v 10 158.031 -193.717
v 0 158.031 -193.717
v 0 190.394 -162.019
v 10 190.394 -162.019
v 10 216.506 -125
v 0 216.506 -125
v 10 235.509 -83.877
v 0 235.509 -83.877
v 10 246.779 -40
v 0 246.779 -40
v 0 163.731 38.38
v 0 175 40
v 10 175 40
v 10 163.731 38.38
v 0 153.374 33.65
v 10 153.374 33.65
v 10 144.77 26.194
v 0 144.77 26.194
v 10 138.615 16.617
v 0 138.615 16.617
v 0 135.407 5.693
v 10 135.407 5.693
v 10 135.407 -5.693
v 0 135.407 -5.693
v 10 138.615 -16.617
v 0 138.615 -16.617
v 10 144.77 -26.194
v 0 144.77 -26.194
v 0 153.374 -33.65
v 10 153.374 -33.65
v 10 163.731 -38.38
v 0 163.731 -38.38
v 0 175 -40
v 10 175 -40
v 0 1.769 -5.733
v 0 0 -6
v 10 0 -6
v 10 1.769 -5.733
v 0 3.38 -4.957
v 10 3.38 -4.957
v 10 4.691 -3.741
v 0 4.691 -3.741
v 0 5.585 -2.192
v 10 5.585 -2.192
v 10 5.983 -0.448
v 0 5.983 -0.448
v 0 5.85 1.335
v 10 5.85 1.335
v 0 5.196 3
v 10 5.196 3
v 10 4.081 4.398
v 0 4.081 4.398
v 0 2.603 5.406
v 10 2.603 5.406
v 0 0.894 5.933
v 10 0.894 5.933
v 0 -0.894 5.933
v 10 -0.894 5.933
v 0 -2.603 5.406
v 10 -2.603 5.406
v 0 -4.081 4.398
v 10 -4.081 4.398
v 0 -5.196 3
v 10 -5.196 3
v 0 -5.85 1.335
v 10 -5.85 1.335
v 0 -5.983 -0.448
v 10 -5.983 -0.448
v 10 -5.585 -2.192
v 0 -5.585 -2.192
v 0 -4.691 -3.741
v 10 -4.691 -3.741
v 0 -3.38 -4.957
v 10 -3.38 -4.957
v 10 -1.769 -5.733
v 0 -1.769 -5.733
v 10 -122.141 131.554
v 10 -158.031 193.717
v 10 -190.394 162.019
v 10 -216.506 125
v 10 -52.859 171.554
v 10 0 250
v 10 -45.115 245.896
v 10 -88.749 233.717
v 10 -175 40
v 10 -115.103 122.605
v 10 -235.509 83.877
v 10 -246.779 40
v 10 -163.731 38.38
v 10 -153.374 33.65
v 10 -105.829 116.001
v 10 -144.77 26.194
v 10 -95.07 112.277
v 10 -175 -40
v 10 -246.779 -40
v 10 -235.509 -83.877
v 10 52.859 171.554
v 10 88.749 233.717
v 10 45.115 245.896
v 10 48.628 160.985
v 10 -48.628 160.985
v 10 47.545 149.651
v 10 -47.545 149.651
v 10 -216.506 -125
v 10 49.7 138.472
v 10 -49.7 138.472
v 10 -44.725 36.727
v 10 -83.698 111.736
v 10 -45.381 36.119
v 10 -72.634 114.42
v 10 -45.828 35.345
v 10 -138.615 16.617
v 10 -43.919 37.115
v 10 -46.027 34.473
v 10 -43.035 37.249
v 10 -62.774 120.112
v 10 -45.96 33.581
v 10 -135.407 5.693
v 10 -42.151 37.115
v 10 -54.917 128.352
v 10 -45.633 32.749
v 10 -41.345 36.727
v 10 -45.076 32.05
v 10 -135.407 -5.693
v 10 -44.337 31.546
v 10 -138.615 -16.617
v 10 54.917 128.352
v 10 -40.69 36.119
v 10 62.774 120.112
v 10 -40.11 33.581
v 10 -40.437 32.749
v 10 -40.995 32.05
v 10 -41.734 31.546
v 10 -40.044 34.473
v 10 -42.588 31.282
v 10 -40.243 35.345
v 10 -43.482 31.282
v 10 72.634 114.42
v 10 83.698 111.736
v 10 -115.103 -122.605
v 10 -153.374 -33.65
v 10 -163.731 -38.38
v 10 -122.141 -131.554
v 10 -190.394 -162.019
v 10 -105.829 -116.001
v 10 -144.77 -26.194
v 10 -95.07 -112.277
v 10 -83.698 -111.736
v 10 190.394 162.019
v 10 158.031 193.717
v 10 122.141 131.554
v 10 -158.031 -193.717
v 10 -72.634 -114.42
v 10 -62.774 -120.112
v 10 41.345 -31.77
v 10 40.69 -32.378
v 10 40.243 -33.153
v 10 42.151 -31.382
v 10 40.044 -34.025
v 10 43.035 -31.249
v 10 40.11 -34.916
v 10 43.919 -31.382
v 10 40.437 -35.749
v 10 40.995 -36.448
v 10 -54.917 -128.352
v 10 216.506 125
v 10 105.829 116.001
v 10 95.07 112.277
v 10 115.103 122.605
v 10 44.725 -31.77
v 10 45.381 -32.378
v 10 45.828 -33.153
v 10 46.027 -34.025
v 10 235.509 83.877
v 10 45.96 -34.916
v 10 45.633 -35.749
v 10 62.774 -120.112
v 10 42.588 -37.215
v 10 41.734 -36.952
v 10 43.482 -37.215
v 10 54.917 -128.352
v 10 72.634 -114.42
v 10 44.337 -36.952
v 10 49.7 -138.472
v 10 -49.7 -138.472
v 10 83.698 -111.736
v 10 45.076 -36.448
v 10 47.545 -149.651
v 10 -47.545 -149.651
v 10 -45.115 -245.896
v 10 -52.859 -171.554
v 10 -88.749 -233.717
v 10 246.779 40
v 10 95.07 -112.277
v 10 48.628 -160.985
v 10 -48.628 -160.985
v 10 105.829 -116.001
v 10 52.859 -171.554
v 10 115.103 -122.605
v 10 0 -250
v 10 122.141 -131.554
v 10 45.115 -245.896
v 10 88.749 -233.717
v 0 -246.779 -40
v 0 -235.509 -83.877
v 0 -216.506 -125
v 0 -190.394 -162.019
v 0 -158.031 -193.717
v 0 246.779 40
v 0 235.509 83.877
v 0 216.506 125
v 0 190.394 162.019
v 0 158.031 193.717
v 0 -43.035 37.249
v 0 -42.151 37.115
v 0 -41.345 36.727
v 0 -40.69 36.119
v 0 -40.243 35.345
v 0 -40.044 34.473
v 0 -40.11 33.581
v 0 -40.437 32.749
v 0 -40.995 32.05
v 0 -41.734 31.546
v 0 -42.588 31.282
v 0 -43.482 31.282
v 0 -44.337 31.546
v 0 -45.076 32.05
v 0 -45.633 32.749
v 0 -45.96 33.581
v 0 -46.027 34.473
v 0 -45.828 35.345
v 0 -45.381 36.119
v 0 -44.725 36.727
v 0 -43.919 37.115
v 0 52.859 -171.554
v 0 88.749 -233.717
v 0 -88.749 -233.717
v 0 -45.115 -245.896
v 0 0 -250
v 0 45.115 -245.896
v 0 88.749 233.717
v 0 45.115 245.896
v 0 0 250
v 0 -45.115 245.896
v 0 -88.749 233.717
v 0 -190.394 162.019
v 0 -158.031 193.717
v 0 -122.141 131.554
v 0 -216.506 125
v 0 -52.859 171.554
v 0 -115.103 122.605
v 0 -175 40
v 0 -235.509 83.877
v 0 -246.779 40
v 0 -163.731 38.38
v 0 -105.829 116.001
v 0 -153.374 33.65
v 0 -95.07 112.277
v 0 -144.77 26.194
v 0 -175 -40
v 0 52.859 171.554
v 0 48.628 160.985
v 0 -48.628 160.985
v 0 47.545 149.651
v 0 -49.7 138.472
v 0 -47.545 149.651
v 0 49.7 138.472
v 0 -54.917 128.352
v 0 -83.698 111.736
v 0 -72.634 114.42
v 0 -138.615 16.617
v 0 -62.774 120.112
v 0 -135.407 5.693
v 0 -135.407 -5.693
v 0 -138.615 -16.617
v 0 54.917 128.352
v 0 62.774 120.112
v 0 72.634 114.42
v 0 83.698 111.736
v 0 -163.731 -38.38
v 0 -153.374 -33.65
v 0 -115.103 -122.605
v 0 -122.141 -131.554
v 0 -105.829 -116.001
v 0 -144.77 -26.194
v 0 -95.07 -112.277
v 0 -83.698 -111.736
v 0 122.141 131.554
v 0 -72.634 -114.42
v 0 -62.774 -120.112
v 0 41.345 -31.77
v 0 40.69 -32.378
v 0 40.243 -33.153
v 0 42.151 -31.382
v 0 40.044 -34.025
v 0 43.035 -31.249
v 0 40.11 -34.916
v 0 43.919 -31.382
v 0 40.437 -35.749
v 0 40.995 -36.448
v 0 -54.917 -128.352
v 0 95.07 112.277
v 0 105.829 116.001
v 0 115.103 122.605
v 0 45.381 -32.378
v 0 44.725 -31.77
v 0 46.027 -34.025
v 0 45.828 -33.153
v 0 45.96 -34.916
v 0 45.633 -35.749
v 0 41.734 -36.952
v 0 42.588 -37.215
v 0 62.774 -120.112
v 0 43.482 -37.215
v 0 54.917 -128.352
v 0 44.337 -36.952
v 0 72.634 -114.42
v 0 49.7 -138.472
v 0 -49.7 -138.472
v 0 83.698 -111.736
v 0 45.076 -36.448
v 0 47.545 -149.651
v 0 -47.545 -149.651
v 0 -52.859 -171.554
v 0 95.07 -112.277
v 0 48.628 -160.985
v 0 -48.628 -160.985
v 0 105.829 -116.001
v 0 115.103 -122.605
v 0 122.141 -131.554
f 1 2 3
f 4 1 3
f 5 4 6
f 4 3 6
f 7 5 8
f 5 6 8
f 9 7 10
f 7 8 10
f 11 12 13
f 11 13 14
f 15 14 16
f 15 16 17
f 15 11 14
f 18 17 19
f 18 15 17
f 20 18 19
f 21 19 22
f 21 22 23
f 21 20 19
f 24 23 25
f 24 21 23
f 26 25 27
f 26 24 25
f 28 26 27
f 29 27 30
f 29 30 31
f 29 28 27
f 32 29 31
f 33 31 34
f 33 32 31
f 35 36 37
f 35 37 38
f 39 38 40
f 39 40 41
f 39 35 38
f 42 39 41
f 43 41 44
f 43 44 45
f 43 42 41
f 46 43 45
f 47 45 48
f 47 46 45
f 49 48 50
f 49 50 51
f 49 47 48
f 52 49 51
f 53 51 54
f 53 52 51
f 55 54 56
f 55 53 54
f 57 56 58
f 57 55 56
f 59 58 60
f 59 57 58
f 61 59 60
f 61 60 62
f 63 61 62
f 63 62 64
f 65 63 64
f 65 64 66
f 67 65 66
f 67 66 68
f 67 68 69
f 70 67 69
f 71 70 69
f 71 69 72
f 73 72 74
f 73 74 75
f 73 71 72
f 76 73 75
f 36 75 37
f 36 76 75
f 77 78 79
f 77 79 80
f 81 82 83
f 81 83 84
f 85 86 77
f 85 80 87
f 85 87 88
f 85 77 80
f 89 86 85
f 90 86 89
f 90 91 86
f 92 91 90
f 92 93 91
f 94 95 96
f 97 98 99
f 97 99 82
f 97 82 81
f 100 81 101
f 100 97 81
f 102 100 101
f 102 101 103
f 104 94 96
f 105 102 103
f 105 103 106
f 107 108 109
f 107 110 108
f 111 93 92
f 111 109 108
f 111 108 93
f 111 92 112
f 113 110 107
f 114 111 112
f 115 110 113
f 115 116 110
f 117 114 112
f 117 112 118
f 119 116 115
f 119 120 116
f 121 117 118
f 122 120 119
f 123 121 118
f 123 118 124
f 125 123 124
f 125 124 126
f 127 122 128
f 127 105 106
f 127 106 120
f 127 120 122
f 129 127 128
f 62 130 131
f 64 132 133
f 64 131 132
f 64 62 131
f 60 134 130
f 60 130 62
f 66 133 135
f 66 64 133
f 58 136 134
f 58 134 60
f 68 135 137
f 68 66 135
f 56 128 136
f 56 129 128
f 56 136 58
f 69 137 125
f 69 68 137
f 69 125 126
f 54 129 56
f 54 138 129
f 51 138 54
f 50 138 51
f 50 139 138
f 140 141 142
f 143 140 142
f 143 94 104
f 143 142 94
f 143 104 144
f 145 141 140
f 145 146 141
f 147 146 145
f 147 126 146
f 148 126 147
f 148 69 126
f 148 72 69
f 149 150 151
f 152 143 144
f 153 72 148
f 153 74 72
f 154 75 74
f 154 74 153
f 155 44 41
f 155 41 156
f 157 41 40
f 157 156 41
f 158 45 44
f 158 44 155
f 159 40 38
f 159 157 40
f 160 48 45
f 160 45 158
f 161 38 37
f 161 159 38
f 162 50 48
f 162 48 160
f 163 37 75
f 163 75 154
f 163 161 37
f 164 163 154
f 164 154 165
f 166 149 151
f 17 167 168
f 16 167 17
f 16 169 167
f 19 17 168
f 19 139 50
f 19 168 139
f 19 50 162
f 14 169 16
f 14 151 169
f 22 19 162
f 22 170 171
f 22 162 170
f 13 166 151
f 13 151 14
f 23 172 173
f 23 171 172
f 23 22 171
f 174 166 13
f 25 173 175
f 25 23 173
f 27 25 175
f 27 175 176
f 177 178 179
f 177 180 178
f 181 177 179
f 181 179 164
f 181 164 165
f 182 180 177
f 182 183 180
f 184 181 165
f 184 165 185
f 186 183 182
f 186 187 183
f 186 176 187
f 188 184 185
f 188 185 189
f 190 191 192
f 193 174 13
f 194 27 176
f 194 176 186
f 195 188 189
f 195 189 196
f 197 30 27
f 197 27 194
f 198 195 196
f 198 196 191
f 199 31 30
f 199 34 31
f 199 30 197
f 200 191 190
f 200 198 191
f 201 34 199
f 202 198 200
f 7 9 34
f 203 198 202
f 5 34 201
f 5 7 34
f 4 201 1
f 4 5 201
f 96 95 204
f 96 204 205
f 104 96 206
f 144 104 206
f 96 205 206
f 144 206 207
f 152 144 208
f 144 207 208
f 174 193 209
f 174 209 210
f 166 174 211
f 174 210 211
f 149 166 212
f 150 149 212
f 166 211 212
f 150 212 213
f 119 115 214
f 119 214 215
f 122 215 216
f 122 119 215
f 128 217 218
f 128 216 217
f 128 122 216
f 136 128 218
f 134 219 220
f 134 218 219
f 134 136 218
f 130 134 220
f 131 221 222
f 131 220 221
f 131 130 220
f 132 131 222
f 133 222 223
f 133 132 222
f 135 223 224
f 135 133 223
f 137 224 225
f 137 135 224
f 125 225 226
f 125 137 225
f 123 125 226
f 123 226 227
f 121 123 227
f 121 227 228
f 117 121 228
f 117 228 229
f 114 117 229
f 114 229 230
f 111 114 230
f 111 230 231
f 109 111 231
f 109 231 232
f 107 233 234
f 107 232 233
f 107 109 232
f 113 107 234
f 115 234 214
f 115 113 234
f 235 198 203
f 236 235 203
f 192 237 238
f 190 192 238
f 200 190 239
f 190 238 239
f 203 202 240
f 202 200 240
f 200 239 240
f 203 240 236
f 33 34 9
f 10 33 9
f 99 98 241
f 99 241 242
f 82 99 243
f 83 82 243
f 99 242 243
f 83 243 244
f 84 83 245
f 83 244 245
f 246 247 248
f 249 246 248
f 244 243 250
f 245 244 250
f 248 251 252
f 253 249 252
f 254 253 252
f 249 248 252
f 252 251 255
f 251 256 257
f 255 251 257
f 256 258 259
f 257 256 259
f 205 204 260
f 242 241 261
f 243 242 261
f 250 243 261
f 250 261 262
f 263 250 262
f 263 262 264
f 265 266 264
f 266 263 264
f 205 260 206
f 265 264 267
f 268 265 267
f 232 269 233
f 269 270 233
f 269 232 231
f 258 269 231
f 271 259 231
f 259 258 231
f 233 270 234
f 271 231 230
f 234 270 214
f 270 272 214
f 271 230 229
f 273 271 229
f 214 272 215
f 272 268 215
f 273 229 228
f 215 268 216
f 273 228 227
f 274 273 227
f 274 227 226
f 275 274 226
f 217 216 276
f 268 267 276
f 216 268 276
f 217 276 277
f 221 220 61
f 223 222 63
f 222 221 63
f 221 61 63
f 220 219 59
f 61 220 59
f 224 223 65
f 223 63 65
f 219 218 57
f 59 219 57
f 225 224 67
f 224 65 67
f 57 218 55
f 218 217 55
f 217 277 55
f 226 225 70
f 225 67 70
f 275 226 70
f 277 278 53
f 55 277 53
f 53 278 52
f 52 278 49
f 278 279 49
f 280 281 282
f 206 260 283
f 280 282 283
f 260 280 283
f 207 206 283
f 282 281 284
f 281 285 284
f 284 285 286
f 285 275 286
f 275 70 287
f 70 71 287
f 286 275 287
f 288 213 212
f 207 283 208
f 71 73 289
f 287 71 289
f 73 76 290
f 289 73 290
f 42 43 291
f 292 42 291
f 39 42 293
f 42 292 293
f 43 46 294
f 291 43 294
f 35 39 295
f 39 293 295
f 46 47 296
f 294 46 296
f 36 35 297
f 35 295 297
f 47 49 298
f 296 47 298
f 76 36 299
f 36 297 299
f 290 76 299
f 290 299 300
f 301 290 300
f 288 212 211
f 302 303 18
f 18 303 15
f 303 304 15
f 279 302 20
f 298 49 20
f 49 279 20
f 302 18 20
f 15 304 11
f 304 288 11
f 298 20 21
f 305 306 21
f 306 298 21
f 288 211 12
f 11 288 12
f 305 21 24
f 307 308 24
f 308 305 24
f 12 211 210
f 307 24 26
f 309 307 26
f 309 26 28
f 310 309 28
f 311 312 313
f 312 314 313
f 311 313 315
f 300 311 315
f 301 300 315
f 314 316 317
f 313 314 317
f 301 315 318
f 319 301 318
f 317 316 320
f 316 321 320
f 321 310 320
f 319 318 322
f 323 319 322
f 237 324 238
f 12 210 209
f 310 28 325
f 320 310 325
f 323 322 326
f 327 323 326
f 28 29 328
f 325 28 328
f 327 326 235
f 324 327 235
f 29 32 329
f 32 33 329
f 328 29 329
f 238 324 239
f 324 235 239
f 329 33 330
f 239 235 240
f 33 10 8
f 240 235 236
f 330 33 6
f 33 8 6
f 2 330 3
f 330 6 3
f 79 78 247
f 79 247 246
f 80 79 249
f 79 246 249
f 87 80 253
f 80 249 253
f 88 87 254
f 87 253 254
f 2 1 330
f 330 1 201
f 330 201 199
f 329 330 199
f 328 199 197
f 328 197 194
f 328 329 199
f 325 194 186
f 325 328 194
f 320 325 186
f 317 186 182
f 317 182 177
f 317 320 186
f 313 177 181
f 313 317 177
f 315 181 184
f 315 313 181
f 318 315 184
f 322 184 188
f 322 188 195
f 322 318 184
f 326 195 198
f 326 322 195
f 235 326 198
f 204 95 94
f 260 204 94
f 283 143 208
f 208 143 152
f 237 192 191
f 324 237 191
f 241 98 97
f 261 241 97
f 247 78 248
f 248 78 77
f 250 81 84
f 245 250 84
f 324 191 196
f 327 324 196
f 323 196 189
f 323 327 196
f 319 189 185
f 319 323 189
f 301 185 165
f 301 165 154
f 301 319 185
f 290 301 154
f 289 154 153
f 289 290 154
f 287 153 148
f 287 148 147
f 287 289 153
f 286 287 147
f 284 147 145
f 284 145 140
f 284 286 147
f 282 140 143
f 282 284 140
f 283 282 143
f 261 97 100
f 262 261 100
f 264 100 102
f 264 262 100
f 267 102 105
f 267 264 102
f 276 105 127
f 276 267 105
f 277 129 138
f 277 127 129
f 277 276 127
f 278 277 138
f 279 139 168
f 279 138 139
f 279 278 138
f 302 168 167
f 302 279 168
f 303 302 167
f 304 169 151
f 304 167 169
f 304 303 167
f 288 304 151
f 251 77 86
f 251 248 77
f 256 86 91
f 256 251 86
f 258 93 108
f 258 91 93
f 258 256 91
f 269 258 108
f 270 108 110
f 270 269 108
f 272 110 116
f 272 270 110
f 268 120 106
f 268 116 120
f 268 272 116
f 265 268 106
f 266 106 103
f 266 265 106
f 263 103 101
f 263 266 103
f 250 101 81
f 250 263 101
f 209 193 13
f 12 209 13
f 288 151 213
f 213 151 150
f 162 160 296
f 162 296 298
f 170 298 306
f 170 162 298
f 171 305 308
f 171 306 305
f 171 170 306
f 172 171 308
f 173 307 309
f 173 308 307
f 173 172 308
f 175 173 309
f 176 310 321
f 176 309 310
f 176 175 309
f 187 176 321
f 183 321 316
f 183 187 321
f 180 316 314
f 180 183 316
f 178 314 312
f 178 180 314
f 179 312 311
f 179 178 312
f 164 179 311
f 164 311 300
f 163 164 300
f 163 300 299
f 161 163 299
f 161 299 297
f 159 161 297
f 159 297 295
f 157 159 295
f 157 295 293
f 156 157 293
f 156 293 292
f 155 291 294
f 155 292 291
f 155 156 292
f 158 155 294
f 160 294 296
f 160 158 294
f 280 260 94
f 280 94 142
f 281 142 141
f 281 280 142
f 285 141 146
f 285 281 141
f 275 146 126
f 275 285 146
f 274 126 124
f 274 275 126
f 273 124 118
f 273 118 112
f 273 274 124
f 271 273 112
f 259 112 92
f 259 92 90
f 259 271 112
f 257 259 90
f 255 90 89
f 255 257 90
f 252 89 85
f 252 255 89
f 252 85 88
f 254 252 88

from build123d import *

# Parameters (mm, degrees)
SKETCH1_R               = 250
SKETCH1_R_2             = 6
SKETCH1_R_3             = 40
BOSS_EXTRUDE1_DEPTH     = 10
CUT_EXTRUDE1_DEPTH      = 354.694783677
CUT_EXTRUDE1_DEPTH_BACK = 354.694783677
SKETCH2_R               = 3


with BuildPart() as part:
    # Sketch1 → Boss-Extrude1 (new body)
    with BuildSketch(Plane(origin=(0, 0, 0), x_dir=(0, 0, -1), z_dir=(1, 0, 0))):
        Circle(SKETCH1_R)
        Circle(SKETCH1_R_2, mode=Mode.SUBTRACT)
        with Locations((0, 175)):
            Circle(SKETCH1_R_3, mode=Mode.SUBTRACT)
        with Locations((151.554445662, 87.5)):
            Circle(SKETCH1_R_3, mode=Mode.SUBTRACT)
        with Locations((151.554445662, -87.5)):
            Circle(SKETCH1_R_3, mode=Mode.SUBTRACT)
        with Locations((0, -175)):
            Circle(SKETCH1_R_3, mode=Mode.SUBTRACT)
        with Locations((-151.554445662, -87.5)):
            Circle(SKETCH1_R_3, mode=Mode.SUBTRACT)
        with Locations((-151.554445662, 87.5)):
            Circle(SKETCH1_R_3, mode=Mode.SUBTRACT)
    extrude(amount=BOSS_EXTRUDE1_DEPTH)

    # Sketch2 → Cut-Extrude1 (cut, two sides: drawn at the far end of the back side and taken through both)
    with BuildSketch(Plane.ZY.offset(-CUT_EXTRUDE1_DEPTH_BACK)):
        with Locations((-34.248705894, 43.035173342)):
            Circle(SKETCH2_R)
        with Locations((34.248705894, -43.035173342)):
            Circle(SKETCH2_R)
        with BuildLine():
            Line((-40, 175), (-40, 246.779253585))
            ThreePointArc((-40, 246.779253585), (0, 250), (40, 246.779253585))
            Line((40, 246.779253585), (40, 175))
            ThreePointArc((40, 175), (0, 215), (-40, 175))
        make_face()
        with BuildLine():
            Line((131.554445662, 122.141016151), (193.717102732, 158.030642944))
            ThreePointArc((193.717102732, 158.030642944), (216.506350946, 125), (233.717102732, 88.748610641))
            Line((233.717102732, 88.748610641), (171.554445662, 52.858983849))
            ThreePointArc((171.554445662, 52.858983849), (186.195461814, 107.5), (131.554445662, 122.141016151))
        make_face()
        with BuildLine():
            Line((171.554445662, -52.858983849), (233.717102732, -88.748610641))
            ThreePointArc((233.717102732, -88.748610641), (216.506350946, -125), (193.717102732, -158.030642944))
            Line((193.717102732, -158.030642944), (131.554445662, -122.141016151))
            ThreePointArc((131.554445662, -122.141016151), (186.195461814, -107.5), (171.554445662, -52.858983849))
        make_face()
        with BuildLine():
            Line((40, -175), (40, -246.779253585))
            ThreePointArc((40, -246.779253585), (0, -250), (-40, -246.779253585))
            Line((-40, -246.779253585), (-40, -175))
            ThreePointArc((-40, -175), (0, -215), (40, -175))
        make_face()
        with BuildLine():
            Line((-131.554445662, -122.141016151), (-193.717102732, -158.030642944))
            ThreePointArc((-193.717102732, -158.030642944), (-216.506350946, -125), (-233.717102732, -88.748610641))
            Line((-233.717102732, -88.748610641), (-171.554445662, -52.858983849))
            ThreePointArc((-171.554445662, -52.858983849), (-186.195461814, -107.5), (-131.554445662, -122.141016151))
        make_face()
        with BuildLine():
            Line((-171.554445662, 52.858983849), (-233.717102732, 88.748610641))
            ThreePointArc((-233.717102732, 88.748610641), (-216.506350946, 125), (-193.717102732, 158.030642944))
            Line((-193.717102732, 158.030642944), (-131.554445662, 122.141016151))
            ThreePointArc((-131.554445662, 122.141016151), (-186.195461814, 107.5), (-171.554445662, 52.858983849))
        make_face()
    extrude(amount=CUT_EXTRUDE1_DEPTH + CUT_EXTRUDE1_DEPTH_BACK, mode=Mode.SUBTRACT)


solid = part.part
